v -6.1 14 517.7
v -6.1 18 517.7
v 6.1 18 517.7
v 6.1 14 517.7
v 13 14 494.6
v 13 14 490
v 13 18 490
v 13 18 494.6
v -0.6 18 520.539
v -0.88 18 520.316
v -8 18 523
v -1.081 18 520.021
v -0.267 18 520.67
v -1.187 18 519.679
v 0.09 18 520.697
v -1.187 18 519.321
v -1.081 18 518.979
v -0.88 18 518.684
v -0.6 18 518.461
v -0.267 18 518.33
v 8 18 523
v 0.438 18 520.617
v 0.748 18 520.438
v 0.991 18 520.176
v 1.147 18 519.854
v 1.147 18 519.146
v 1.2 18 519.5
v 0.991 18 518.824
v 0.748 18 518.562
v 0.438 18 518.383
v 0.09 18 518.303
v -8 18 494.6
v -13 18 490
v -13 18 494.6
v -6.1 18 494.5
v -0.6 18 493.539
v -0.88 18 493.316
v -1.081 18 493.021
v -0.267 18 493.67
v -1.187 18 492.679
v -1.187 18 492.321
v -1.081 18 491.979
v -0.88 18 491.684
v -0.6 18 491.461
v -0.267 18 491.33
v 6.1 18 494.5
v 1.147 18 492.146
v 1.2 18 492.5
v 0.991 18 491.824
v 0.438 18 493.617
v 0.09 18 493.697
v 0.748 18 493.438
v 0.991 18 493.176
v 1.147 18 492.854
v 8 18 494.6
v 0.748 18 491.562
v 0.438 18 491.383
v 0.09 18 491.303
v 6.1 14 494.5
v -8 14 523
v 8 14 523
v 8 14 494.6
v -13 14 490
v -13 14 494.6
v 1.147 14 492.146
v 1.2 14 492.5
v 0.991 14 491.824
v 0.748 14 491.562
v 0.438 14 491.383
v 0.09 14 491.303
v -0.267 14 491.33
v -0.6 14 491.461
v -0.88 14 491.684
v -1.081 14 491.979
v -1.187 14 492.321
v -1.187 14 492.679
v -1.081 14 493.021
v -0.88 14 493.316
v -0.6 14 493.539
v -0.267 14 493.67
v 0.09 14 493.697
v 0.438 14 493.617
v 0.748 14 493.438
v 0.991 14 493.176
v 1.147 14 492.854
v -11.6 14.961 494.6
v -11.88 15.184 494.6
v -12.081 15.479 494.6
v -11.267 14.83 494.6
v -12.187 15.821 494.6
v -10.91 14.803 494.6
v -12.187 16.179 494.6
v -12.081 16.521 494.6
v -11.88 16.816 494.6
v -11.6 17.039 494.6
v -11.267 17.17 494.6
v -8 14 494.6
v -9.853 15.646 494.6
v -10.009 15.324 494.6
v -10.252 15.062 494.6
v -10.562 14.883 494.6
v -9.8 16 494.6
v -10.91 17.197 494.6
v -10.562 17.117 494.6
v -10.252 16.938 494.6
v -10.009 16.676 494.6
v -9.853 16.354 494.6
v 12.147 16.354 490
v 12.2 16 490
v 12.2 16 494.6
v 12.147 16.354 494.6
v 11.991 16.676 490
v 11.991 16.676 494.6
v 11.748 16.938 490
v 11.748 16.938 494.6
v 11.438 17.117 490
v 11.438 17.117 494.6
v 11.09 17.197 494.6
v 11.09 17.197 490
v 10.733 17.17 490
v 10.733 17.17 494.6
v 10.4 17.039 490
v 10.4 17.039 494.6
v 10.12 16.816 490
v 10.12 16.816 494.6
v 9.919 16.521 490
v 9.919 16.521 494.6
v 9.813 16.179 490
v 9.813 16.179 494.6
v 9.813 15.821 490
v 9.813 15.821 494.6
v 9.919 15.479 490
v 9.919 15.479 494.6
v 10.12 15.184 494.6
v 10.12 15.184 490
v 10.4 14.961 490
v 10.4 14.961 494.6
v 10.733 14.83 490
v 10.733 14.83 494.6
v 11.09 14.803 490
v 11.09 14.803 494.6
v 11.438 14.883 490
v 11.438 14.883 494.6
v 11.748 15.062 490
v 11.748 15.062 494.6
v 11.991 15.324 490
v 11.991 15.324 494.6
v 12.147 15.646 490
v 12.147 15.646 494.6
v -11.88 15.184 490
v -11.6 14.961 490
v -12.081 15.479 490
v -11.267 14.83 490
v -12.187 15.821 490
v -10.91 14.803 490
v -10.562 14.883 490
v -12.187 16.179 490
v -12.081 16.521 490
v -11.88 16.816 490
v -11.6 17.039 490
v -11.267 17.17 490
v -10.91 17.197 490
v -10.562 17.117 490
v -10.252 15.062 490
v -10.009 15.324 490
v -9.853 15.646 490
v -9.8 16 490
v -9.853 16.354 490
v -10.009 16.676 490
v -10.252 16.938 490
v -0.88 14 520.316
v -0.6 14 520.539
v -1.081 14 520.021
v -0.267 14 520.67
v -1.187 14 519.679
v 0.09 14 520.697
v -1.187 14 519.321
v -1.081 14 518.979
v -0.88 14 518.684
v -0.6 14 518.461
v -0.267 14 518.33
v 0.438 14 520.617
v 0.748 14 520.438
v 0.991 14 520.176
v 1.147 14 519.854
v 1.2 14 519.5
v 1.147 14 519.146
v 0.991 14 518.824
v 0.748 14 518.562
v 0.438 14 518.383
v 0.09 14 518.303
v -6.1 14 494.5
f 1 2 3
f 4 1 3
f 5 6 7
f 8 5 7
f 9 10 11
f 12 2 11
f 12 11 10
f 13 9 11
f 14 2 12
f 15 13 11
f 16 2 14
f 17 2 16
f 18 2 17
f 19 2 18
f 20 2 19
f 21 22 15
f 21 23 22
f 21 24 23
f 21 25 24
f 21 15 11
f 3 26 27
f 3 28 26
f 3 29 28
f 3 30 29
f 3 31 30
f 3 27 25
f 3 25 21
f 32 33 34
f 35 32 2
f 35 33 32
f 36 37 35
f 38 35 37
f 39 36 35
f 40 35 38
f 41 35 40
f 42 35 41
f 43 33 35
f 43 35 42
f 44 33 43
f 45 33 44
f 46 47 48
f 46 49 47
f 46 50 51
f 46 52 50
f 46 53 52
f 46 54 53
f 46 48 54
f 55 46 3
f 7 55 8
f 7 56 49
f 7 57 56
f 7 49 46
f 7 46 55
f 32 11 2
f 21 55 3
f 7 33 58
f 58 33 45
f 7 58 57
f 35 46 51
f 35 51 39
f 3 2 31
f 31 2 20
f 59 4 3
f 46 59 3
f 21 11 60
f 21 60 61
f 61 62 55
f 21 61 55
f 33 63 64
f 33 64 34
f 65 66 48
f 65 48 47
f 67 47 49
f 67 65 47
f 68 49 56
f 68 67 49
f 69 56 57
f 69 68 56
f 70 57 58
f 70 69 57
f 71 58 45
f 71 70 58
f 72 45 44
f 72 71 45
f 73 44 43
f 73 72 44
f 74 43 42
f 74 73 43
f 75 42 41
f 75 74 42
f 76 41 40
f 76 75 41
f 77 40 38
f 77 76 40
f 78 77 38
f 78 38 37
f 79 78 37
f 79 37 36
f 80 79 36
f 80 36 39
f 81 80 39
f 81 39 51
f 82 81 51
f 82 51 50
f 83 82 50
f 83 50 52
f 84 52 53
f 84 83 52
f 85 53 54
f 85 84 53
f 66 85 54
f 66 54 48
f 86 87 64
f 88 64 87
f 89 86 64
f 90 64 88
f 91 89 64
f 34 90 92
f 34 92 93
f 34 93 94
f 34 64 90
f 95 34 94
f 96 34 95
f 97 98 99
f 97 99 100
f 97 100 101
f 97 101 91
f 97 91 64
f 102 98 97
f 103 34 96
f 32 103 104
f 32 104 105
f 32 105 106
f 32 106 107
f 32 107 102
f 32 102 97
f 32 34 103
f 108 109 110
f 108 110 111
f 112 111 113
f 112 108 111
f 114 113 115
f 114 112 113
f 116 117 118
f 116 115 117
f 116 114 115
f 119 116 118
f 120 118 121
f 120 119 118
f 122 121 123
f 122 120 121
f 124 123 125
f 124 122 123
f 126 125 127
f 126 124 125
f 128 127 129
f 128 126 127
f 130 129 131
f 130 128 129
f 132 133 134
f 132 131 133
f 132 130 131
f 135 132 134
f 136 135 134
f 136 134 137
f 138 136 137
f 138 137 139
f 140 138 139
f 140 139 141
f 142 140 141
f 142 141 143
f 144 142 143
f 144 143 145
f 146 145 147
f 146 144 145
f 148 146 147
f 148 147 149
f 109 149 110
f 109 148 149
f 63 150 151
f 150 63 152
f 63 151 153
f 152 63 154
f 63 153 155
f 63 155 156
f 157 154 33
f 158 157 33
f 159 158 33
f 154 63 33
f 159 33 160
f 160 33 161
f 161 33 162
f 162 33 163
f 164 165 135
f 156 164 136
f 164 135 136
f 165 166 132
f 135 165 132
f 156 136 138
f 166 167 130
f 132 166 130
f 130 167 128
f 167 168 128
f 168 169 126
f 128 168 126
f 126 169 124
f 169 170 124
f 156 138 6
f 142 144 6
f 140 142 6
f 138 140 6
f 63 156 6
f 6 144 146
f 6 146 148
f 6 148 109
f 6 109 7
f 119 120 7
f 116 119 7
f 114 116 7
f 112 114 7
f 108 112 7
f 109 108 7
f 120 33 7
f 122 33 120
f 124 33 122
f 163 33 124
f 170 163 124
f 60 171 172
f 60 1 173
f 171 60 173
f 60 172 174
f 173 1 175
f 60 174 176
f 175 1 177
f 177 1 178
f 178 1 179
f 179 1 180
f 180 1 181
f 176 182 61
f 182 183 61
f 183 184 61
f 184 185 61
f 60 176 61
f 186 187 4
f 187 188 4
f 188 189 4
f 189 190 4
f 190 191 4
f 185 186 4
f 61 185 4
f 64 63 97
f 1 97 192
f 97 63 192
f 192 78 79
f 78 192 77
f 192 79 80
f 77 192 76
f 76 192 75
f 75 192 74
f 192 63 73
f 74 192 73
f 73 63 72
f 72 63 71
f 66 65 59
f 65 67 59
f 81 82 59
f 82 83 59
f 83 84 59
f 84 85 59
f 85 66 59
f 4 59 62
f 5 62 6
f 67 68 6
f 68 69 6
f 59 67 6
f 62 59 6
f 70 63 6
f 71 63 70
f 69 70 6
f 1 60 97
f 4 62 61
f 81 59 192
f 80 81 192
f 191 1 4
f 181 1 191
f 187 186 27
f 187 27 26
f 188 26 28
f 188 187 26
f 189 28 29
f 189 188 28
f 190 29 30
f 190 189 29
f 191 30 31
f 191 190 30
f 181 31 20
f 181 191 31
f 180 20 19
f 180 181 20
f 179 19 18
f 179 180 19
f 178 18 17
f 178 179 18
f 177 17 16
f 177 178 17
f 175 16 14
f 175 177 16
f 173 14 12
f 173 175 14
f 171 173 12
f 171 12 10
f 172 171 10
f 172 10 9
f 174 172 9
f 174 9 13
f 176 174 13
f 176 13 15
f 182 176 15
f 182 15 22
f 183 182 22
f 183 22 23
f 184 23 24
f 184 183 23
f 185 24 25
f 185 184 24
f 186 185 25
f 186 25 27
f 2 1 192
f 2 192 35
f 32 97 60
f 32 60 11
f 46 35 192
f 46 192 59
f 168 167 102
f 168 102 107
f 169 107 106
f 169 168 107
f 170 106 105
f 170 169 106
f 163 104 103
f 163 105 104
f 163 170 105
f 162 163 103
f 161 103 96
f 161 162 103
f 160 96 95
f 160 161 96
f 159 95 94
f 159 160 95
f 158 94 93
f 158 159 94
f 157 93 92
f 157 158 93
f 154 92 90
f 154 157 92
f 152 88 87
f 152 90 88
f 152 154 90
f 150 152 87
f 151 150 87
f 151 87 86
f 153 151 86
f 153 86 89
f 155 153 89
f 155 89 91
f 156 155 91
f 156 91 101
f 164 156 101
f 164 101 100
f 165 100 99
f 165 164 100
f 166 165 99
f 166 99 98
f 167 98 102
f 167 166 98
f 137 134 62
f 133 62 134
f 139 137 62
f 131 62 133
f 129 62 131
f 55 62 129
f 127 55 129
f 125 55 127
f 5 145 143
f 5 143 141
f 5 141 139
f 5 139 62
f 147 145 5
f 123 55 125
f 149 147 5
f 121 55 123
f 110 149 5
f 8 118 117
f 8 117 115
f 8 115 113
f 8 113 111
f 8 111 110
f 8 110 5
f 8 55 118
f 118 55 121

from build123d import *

# Parameters (mm, degrees)
BOX008_W          = 16
BOX008_H          = 4
BOX008_DEPTH      = 33
CYLINDER012_R     = 1.2
CYLINDER012_DEPTH = 20
ARRAY017_X_COUNT  = 2
ARRAY017_X_PITCH  = 22
BOX010_W          = 26
BOX010_H          = 4
BOX010_DEPTH      = 4.6
CYLINDER011_R     = 1.2
CYLINDER011_DEPTH = 4
ARRAY004_Z_COUNT  = 2
ARRAY004_Z_PITCH  = 27
BOX009_W          = 12.2
BOX009_H          = 4
BOX009_DEPTH      = 23.2


with BuildPart() as cube:
    # Box008 → Box008 (new body)
    with BuildSketch(Plane(origin=(-8, 14, 5), x_dir=(1, 0, 0), z_dir=(0, 0, 1))):
        with Locations((8, 2)):
            Rectangle(BOX008_W, BOX008_H)
    extrude(amount=BOX008_DEPTH)


with BuildPart() as connectorscrewcutters:
    # Cylinder012 → Cylinder012 (new body)
    with BuildSketch(Plane(origin=(11, 16, -5), x_dir=(1, 0, 0), z_dir=(0, 0, 1))):
        Circle(CYLINDER012_R)
    extrude(amount=CYLINDER012_DEPTH)

    # Array017 X: ConnectorScrewCutters ×2


with BuildPart() as connectorscrewcutters_1:
    add(connectorscrewcutters.part)
    with Locations(*[(-i * ARRAY017_X_PITCH, 0, 0) for i in range(1, ARRAY017_X_COUNT)]):
        add(connectorscrewcutters.part)


with BuildPart() as cut030:
    # Box010 → Box010 (new body)
    with BuildSketch(Plane(origin=(-13, 14, 5), x_dir=(1, 0, 0), z_dir=(0, 0, 1))):
        with Locations((13, 2)):
            Rectangle(BOX010_W, BOX010_H)
    extrude(amount=BOX010_DEPTH)

    # Cut028: cut ConnectorScrewCutters
    add(connectorscrewcutters_1.part, mode=Mode.SUBTRACT)

    # Cut030: cut Cube
    add(cube.part, mode=Mode.SUBTRACT)


with BuildPart() as screwcutters:
    # Cylinder011 → Cylinder011 (new body)
    with BuildSketch(Plane(origin=(0, 14, 7.5), x_dir=(1, 0, 0), z_dir=(0, 1, 0))):
        Circle(CYLINDER011_R)
    extrude(amount=CYLINDER011_DEPTH)

    # Array004 Z: ScrewCutters ×2


with BuildPart() as screwcutters_1:
    add(screwcutters.part)
    with Locations(*[(0, 0, i * ARRAY004_Z_PITCH) for i in range(1, ARRAY004_Z_COUNT)]):
        add(screwcutters.part)


with BuildPart() as cube001:
    # Box009 → Box009 (new body)
    with BuildSketch(Plane(origin=(-6.1, 14, 9.5), x_dir=(1, 0, 0), z_dir=(0, 0, 1))):
        with Locations((6.1, 2)):
            Rectangle(BOX009_W, BOX009_H)
    extrude(amount=BOX009_DEPTH)


with BuildPart() as cameraconnector:
    # Cut026 base: copy of Cube
    add(cube.part)

    # Cut026: cut Cube001
    add(cube001.part, mode=Mode.SUBTRACT)

    # Cut027: cut ScrewCutters
    add(screwcutters_1.part, mode=Mode.SUBTRACT)

    # Fusion003: union Cut030
    add(cut030.part)


with BuildPart() as cameraconnector_1:
    # Fusion003 placement: moved
    add(cameraconnector.part.moved(Location((0, 0, 485))))


solid = cameraconnector_1.part
